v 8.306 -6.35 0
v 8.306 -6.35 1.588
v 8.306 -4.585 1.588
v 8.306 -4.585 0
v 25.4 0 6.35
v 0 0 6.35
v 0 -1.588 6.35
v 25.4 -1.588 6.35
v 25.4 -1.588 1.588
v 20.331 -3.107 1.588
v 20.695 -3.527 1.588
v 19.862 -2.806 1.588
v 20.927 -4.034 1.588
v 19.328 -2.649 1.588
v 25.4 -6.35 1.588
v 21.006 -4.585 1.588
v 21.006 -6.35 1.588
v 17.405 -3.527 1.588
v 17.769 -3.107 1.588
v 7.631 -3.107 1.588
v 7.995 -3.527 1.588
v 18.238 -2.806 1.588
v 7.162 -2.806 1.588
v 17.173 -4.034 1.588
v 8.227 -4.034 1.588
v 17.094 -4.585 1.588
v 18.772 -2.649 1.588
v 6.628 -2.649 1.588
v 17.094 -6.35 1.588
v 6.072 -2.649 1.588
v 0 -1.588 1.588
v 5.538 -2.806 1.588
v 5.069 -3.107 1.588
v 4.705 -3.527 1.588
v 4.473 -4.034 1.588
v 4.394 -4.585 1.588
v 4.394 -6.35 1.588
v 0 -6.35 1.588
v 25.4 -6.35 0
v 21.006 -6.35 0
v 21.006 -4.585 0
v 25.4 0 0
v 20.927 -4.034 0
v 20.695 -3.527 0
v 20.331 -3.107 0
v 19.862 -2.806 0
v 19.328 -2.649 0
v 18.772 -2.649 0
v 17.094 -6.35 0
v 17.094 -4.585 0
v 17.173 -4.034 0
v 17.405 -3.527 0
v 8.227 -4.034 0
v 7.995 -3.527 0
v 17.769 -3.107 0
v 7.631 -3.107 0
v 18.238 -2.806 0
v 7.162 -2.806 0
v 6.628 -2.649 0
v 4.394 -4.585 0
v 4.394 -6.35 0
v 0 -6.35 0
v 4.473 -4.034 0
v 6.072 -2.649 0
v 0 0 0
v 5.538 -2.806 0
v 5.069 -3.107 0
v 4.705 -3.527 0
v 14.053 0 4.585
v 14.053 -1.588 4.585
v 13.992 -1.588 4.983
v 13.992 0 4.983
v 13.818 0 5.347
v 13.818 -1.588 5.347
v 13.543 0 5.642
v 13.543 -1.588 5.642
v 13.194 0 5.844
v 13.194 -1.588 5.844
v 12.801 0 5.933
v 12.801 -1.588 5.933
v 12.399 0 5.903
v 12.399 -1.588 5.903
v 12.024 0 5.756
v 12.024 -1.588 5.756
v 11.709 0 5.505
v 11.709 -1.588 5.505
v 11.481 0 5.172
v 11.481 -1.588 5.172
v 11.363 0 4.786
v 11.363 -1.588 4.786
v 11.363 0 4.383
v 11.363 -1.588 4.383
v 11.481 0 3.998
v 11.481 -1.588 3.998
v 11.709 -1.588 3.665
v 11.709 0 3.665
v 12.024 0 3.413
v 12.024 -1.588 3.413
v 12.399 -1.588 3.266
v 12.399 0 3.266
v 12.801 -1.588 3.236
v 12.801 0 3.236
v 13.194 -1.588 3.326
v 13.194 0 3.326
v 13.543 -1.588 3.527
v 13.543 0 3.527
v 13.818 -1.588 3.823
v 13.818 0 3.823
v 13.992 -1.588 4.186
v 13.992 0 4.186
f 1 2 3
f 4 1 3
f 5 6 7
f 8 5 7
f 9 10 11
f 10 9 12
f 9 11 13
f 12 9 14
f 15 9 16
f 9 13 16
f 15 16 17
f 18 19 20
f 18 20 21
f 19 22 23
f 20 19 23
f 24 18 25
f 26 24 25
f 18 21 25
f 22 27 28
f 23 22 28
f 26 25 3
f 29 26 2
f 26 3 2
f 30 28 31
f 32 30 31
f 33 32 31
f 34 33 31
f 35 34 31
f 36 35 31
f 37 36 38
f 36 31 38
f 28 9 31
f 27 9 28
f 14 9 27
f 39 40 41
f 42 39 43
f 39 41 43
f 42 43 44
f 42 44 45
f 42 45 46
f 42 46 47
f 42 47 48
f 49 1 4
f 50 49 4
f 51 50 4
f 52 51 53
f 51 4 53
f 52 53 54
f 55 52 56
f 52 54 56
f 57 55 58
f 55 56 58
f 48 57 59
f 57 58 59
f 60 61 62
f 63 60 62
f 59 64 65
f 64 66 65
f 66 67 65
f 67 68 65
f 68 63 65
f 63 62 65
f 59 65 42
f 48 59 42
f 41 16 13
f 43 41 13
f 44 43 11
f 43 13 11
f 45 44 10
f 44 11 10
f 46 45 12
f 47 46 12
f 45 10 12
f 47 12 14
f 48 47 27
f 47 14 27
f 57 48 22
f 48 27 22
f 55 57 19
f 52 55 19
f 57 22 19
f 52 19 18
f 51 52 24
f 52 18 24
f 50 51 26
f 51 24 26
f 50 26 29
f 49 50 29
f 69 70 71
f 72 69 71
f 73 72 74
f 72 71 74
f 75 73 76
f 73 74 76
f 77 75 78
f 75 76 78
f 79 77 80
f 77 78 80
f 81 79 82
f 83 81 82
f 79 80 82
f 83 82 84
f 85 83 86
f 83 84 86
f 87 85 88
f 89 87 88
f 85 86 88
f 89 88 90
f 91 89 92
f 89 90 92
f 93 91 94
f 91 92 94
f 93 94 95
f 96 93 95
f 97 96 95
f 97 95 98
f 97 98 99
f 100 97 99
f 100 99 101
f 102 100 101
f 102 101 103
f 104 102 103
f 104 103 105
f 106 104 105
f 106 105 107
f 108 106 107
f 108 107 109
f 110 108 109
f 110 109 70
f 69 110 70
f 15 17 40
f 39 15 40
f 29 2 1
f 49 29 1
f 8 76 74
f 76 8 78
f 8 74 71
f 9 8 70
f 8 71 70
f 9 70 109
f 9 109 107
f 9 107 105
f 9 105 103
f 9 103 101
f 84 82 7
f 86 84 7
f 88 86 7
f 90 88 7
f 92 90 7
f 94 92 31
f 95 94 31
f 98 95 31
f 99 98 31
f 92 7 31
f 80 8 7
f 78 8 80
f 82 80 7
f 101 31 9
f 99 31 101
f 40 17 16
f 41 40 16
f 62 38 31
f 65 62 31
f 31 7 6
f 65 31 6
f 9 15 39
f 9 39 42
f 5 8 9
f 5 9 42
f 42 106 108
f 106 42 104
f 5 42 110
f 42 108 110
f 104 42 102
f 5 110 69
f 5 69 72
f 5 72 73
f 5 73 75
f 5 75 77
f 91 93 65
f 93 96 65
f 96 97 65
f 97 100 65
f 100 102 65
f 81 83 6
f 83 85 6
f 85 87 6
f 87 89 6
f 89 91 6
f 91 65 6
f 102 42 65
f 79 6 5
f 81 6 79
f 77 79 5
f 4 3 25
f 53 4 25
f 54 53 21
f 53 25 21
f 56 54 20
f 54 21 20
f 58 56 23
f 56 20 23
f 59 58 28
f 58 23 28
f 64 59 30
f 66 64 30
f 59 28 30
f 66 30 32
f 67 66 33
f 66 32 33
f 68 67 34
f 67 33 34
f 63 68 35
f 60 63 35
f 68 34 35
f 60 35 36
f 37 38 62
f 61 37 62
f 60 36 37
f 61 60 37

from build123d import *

# Parameters (mm, degrees)
F1_DEPTH = 25.4
F3_DEPTH = 1.5885
F4_R     = 1.35255
F5_DEPTH = 1.5885


with BuildPart() as f1:
    # F0 (on Right) → F1 (new body)
    with BuildSketch(Plane.YZ):
        Polygon((-6.35, 1.5875), (-6.35, 0), (0, 0), (0, 6.35), (-1.5875, 6.35), (-1.5875, 1.5875), align=None)
    extrude(amount=F1_DEPTH)

    # F2 (on face) → F3 (cut, through all)
    with BuildSketch(Plane.XY.offset(1.5875)):
        with BuildLine():
            Line((8.3058, -6.35), (8.3058, -4.5847))
            ThreePointArc((8.3058, -4.5847), (6.35, -2.6289), (4.3942, -4.5847))
            Line((4.3942, -4.5847), (4.3942, -6.35))
            Line((4.3942, -6.35), (8.3058, -6.35))
        make_face()
        with BuildLine():
            ThreePointArc((21.0058, -4.5847), (19.05, -2.6289), (17.0942, -4.5847))
            Line((17.0942, -4.5847), (17.0942, -6.35))
            Line((17.0942, -6.35), (21.0058, -6.35))
            Line((21.0058, -6.35), (21.0058, -4.5847))
        make_face()
    extrude(amount=-F3_DEPTH, mode=Mode.SUBTRACT)

    # F4 (on face) → F5 (cut, through all)
    with BuildSketch(Plane.XZ.offset(1.5875)):
        with Locations((12.7, 4.5847)):
            Circle(F4_R)
    extrude(amount=-F5_DEPTH, mode=Mode.SUBTRACT)


solid = f1.part
